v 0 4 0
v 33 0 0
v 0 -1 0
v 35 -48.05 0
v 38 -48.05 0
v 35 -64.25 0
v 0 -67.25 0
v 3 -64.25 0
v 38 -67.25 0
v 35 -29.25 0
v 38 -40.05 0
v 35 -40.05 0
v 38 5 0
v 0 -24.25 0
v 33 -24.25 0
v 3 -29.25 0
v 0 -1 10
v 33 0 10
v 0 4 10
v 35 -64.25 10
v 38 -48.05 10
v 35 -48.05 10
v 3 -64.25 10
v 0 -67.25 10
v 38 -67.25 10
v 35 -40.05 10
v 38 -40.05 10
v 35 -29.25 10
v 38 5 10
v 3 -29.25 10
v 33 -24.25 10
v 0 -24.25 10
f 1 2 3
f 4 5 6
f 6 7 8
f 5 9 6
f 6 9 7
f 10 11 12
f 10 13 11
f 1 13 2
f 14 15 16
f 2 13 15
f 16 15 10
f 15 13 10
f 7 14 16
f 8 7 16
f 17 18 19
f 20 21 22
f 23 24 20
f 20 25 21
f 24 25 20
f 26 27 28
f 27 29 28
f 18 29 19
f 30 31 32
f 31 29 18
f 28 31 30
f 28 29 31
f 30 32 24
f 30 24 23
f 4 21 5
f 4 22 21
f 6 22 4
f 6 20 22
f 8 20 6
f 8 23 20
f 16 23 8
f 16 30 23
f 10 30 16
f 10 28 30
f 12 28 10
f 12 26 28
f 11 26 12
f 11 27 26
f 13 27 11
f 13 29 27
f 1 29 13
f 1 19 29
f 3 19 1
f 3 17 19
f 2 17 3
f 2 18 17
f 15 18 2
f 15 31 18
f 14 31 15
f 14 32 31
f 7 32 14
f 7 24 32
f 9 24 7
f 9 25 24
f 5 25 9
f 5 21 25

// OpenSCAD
desk_thickness = 24.25; // actual measured thickness
clamp_tightening = 1; // decrease width by this amount at the tip to make it tighter; discover by printing at zero and then measuring the resulting gapping

clamp_depth = 33; // how much it goes back onto the desk
clamp_thickness = 5; // how thick is the entire shape (i.e. height above/below desk when installed)
clamp_width = 10; // top-down width when installed
cable_tray_height = 35; // vertical height of the opening

bottom_thickness = 3; // extra thick on the bottom to hold up cables

cable_tray_opening = 8; // largest cable diameter plus any extra space
// tab heights based on size of largest cable; 60/40 ratio
opening_bottom_tab_height = (cable_tray_height-cable_tray_opening)*0.6;
opening_top_tab_height = (cable_tray_height-cable_tray_opening)*0.4;

/* top-down; x->, y^
B    A
0   1
xxxx
3   2
 8  9a
    9b9c
 
   6b6a
 7 6c
4    5
*/

linear_extrude(clamp_width) {
    
polygon([
/* 0 */  [0, 0-clamp_tightening],
/* 1 */  [clamp_depth, 0],
/* 2 */  [clamp_depth, 0-desk_thickness],
/* 3 */  [0, 0-desk_thickness],
/* 4 */  [0, 0-desk_thickness-clamp_thickness-cable_tray_height-bottom_thickness],
/* 5 */  [clamp_depth+clamp_thickness, 0-desk_thickness-clamp_thickness-cable_tray_height-bottom_thickness],
/* 6a */ [clamp_depth+clamp_thickness, 0-desk_thickness-clamp_thickness-cable_tray_height+opening_bottom_tab_height],
/* 6b */ [clamp_depth+clamp_thickness-bottom_thickness, 0-desk_thickness-clamp_thickness-cable_tray_height+opening_bottom_tab_height],
/* 6c */ [clamp_depth+clamp_thickness-bottom_thickness, 0-desk_thickness-clamp_thickness-cable_tray_height],
/* 7 */  [bottom_thickness, 0-desk_thickness-clamp_thickness-cable_tray_height],
/* 8 */  [bottom_thickness, 0-desk_thickness-clamp_thickness],
/* 9a */ [clamp_depth+clamp_thickness-bottom_thickness, 0-desk_thickness-clamp_thickness],
/* 9b */ [clamp_depth+clamp_thickness-bottom_thickness, 0-desk_thickness-clamp_thickness-opening_top_tab_height],
/* 9c */ [clamp_depth+clamp_thickness, 0-desk_thickness-clamp_thickness-opening_top_tab_height],
/* A */  [clamp_depth+clamp_thickness, 0+clamp_thickness],
/* B */  [0, 0+clamp_thickness-clamp_tightening],
]);
};
